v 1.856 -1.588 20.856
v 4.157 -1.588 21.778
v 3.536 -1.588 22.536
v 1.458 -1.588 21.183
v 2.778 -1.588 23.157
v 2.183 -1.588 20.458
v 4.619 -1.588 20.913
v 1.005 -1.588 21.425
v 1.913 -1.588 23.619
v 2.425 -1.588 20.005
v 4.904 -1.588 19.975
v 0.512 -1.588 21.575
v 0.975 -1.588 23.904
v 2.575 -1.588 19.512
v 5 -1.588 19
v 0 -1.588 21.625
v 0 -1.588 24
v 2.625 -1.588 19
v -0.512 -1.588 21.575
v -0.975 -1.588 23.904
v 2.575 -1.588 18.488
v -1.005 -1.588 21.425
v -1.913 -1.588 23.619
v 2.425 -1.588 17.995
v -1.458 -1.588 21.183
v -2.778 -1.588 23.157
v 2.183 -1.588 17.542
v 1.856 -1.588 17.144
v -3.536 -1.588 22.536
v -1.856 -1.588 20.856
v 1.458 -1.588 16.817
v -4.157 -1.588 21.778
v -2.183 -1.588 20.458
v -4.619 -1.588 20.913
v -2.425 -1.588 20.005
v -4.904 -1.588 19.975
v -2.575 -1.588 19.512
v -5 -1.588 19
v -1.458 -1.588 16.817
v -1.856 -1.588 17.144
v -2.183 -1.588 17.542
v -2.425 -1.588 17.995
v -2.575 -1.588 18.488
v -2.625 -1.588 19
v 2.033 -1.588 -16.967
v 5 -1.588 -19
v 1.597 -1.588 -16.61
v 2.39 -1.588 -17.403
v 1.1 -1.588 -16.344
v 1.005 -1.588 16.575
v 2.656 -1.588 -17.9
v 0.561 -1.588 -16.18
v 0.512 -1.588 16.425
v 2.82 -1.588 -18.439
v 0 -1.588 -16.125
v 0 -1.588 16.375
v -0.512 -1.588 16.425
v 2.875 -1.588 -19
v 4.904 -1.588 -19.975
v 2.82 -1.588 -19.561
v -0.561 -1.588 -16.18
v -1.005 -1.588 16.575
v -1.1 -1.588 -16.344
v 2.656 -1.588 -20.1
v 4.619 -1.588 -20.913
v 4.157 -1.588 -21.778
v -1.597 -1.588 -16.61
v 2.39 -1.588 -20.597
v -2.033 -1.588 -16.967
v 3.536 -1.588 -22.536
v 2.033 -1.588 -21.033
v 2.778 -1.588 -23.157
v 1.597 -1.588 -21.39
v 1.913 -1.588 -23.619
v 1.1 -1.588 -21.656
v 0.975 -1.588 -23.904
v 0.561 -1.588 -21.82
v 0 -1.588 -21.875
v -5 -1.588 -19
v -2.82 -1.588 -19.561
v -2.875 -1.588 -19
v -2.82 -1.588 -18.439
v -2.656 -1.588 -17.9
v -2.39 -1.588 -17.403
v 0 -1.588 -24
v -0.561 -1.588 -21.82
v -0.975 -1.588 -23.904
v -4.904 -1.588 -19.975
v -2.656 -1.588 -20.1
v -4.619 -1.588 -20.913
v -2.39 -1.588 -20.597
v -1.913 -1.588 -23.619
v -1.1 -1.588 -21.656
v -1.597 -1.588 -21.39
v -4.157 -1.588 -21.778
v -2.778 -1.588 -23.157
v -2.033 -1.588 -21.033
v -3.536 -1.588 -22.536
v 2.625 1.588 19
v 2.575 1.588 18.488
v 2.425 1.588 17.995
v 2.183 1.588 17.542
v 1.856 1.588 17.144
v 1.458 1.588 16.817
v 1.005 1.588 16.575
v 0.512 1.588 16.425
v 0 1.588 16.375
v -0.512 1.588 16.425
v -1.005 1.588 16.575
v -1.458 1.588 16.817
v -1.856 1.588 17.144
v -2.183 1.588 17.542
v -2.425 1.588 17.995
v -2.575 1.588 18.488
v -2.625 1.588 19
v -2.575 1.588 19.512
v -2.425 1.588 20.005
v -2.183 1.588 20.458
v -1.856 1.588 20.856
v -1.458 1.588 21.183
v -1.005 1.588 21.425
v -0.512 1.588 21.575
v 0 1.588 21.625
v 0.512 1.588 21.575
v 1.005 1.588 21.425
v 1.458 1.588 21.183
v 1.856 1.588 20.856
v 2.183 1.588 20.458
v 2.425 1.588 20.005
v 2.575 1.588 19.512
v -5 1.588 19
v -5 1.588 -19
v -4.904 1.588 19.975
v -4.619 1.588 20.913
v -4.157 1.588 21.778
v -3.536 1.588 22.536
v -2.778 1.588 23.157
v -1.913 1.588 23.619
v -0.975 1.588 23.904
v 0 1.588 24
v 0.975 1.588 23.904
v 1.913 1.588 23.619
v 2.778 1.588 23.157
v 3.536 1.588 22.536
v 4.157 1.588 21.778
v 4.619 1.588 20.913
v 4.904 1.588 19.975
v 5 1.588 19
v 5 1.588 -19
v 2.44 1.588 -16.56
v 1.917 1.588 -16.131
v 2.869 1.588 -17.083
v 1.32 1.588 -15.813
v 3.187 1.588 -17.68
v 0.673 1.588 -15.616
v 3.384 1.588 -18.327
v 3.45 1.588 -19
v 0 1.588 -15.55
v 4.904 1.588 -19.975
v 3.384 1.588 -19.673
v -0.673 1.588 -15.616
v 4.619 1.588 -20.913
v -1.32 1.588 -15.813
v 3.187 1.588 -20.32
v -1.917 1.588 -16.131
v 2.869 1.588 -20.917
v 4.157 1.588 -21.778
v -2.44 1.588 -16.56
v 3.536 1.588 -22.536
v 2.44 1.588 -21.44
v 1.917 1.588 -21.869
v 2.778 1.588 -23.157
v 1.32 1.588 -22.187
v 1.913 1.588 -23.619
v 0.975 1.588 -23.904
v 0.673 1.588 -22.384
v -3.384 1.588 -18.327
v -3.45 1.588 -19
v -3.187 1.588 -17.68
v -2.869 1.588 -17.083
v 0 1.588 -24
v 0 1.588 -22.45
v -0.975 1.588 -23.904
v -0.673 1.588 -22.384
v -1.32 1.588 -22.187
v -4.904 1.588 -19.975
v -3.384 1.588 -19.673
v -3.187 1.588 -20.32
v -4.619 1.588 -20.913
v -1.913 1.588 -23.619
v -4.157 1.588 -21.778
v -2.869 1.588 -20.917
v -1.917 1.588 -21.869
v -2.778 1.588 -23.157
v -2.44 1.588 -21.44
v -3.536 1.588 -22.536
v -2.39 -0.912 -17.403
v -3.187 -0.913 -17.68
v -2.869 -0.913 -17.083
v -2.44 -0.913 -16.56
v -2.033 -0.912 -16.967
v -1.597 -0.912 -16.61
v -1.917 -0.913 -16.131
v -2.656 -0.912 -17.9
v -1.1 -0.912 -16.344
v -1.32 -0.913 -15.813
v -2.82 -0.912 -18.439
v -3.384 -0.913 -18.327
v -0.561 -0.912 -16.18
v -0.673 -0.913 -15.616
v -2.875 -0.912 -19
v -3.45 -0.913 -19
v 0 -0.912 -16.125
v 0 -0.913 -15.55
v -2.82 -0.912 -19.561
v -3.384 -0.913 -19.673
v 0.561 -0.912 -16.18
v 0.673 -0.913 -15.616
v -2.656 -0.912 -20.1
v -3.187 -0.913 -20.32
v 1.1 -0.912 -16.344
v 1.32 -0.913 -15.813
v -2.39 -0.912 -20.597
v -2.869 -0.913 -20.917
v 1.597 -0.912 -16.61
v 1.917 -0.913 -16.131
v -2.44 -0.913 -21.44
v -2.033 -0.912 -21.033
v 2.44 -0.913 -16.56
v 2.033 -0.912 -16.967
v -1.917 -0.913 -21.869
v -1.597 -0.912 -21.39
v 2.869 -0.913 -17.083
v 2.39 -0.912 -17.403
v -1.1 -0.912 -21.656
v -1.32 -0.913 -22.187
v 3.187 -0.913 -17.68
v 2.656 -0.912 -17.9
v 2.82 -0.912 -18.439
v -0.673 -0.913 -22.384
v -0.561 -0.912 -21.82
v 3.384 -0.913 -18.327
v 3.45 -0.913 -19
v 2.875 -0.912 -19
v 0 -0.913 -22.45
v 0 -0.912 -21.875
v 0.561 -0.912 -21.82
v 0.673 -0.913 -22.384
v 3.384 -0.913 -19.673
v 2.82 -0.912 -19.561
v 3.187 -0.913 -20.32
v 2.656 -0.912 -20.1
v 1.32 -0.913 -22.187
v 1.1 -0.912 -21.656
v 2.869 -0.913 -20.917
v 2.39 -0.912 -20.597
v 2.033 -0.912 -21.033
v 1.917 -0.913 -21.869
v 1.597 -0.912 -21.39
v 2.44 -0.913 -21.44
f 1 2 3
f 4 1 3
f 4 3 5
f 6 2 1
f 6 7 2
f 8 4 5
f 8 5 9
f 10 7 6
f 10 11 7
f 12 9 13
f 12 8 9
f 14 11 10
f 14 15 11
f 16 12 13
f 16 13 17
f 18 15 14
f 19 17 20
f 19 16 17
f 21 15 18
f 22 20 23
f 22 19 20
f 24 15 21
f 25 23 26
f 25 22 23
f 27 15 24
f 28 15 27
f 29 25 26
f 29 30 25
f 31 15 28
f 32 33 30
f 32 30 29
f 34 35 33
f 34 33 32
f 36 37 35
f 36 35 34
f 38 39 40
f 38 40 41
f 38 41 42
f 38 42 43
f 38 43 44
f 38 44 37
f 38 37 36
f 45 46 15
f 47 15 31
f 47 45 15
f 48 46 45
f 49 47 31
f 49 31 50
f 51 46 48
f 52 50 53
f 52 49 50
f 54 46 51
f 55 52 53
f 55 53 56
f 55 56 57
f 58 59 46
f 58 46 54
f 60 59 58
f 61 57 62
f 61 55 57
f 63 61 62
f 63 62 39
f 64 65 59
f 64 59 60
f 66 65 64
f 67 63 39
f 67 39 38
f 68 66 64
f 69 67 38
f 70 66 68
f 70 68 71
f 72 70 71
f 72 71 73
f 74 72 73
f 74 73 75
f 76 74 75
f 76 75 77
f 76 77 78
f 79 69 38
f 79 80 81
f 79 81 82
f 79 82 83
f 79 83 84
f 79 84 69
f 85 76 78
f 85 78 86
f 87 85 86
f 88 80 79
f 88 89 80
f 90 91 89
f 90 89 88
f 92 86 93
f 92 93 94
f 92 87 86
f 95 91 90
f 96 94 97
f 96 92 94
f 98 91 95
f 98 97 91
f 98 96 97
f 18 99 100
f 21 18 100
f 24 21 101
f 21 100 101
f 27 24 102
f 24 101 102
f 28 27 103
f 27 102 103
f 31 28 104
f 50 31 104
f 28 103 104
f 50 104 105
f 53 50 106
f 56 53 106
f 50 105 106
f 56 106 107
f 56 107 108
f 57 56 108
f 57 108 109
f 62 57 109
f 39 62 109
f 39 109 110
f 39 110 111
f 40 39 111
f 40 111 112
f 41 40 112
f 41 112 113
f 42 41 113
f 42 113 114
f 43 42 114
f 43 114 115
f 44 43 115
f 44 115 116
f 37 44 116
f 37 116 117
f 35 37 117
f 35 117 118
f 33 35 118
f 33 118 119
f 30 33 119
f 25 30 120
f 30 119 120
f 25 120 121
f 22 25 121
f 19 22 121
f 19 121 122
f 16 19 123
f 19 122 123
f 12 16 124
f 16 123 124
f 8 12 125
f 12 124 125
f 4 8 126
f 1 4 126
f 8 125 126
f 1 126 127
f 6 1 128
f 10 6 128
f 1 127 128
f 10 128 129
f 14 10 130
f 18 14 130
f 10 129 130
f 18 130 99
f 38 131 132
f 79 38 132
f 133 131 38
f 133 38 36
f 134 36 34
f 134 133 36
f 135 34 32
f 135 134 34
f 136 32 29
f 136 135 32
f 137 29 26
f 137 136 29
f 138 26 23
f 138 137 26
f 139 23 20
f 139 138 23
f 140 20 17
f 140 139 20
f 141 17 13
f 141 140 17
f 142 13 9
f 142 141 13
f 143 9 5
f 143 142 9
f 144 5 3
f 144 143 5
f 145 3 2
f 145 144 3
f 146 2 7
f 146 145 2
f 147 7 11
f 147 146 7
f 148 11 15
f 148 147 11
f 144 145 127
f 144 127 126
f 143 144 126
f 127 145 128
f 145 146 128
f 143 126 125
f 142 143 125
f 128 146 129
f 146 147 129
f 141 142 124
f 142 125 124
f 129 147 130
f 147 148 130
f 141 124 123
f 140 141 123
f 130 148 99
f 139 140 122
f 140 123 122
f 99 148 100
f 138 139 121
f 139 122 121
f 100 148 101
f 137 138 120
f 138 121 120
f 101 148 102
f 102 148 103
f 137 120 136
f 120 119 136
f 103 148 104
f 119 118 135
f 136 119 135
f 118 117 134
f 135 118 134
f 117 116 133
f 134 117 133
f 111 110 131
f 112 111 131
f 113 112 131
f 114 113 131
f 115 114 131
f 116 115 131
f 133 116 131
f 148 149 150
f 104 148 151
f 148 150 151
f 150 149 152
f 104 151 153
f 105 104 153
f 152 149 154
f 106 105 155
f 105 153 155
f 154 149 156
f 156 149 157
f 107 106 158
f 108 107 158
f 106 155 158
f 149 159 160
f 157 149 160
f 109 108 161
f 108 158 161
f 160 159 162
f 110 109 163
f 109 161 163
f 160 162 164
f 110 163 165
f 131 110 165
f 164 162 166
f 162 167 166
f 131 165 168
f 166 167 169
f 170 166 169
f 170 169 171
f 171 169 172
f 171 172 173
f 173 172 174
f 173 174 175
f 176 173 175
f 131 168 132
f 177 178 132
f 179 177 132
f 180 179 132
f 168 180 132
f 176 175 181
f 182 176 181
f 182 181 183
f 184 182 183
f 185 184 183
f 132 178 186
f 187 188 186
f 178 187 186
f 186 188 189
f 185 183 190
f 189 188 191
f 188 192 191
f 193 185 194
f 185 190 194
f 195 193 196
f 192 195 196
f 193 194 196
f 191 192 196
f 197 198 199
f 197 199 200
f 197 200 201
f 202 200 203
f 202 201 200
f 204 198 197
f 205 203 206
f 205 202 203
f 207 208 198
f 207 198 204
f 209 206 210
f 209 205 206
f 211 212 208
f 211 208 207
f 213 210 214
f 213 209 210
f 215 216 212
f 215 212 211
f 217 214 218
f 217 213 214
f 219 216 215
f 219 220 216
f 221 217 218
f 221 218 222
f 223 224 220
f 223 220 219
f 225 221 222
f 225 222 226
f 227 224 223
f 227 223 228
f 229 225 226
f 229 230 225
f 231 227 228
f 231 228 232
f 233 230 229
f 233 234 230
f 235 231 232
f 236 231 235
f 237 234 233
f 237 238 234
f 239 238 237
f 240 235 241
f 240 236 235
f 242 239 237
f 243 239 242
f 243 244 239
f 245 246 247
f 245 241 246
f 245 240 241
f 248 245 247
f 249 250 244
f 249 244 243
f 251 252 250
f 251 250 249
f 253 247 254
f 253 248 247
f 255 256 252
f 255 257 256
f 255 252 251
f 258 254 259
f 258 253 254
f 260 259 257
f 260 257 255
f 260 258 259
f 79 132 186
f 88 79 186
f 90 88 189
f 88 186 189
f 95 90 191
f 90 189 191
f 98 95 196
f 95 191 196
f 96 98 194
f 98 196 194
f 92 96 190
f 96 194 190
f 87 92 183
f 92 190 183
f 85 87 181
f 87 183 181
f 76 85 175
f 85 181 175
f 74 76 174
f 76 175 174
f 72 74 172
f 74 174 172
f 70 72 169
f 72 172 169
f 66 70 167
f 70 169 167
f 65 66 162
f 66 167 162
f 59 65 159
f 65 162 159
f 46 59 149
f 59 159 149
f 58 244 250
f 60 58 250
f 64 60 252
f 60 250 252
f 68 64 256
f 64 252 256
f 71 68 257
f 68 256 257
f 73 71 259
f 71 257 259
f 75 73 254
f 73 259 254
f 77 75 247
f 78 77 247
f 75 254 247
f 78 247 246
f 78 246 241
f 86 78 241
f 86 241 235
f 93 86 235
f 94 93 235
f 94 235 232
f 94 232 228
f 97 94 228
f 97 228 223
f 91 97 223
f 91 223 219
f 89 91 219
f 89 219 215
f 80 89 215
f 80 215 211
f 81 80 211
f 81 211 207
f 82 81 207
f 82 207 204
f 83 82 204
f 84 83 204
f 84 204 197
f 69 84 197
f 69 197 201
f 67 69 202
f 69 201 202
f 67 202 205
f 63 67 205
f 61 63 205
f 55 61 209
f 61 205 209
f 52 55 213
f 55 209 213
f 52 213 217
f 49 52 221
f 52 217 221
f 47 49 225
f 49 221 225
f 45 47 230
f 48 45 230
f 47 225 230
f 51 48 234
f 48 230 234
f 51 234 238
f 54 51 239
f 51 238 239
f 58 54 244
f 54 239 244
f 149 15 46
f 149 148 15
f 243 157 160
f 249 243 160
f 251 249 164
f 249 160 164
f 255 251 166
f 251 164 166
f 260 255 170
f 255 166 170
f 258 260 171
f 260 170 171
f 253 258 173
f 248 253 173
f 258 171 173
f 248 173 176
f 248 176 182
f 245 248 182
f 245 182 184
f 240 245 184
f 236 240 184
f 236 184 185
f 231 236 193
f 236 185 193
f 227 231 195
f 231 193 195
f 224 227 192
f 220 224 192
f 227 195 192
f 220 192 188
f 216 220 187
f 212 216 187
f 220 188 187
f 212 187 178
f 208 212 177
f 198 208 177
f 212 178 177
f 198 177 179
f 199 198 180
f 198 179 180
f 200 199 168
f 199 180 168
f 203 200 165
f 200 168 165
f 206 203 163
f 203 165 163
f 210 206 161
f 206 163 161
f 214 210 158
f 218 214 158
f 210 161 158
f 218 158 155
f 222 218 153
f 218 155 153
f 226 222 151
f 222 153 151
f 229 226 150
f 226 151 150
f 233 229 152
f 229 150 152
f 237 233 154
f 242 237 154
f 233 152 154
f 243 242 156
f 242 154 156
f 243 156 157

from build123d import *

# Parameters (mm, degrees)
SKETCH1_W           = 10
SKETCH1_H           = 38
BOSS_EXTRUDE1_DEPTH = 1.5875
SKETCH2_R           = 3.45
CUT_EXTRUDE1_DEPTH  = 2.5
SKETCH3_R           = 2.875
CUT_EXTRUDE2_DEPTH  = 1.675
SKETCH4_R           = 2.625
CUT_EXTRUDE3_DEPTH  = 4.175


with BuildPart() as part:
    # Sketch1 → Boss-Extrude1 (new body, symmetric)
    with BuildSketch(Plane(origin=(0, 0, 0), x_dir=(1, 0, 0), z_dir=(0, 1, 0))):
        with BuildLine():
            ThreePointArc((-5, 19), (0, 24), (5, 19))
            Line((5, 19), (-5, 19))
        make_face()
        Rectangle(SKETCH1_W, SKETCH1_H)
        with BuildLine():
            Line((5, -19), (-5, -19))
            ThreePointArc((-5, -19), (0, -24), (5, -19))
        make_face()
    extrude(amount=BOSS_EXTRUDE1_DEPTH, both=True)

    # Sketch2 → Cut-Extrude1 (cut)
    with BuildSketch(Plane(origin=(0, 1.5875, 0), x_dir=(1, 0, 0), z_dir=(0, 1, 0))):
        with Locations((0, 19)):
            Circle(SKETCH2_R)
    extrude(amount=-CUT_EXTRUDE1_DEPTH, mode=Mode.SUBTRACT)

    # Sketch3 → Cut-Extrude2 (cut, through all)
    with BuildSketch(Plane(origin=(0, -0.9125, 0), x_dir=(1, 0, 0), z_dir=(0, 1, 0))):
        with Locations((0, 19)):
            Circle(SKETCH3_R)
    extrude(amount=-CUT_EXTRUDE2_DEPTH, mode=Mode.SUBTRACT)

    # Sketch4 → Cut-Extrude3 (cut, through all)
    with BuildSketch(Plane(origin=(0, 1.5875, 0), x_dir=(1, 0, 0), z_dir=(0, 1, 0))):
        with Locations((0, -19)):
            Circle(SKETCH4_R)
    extrude(amount=-CUT_EXTRUDE3_DEPTH, mode=Mode.SUBTRACT)


solid = part.part
